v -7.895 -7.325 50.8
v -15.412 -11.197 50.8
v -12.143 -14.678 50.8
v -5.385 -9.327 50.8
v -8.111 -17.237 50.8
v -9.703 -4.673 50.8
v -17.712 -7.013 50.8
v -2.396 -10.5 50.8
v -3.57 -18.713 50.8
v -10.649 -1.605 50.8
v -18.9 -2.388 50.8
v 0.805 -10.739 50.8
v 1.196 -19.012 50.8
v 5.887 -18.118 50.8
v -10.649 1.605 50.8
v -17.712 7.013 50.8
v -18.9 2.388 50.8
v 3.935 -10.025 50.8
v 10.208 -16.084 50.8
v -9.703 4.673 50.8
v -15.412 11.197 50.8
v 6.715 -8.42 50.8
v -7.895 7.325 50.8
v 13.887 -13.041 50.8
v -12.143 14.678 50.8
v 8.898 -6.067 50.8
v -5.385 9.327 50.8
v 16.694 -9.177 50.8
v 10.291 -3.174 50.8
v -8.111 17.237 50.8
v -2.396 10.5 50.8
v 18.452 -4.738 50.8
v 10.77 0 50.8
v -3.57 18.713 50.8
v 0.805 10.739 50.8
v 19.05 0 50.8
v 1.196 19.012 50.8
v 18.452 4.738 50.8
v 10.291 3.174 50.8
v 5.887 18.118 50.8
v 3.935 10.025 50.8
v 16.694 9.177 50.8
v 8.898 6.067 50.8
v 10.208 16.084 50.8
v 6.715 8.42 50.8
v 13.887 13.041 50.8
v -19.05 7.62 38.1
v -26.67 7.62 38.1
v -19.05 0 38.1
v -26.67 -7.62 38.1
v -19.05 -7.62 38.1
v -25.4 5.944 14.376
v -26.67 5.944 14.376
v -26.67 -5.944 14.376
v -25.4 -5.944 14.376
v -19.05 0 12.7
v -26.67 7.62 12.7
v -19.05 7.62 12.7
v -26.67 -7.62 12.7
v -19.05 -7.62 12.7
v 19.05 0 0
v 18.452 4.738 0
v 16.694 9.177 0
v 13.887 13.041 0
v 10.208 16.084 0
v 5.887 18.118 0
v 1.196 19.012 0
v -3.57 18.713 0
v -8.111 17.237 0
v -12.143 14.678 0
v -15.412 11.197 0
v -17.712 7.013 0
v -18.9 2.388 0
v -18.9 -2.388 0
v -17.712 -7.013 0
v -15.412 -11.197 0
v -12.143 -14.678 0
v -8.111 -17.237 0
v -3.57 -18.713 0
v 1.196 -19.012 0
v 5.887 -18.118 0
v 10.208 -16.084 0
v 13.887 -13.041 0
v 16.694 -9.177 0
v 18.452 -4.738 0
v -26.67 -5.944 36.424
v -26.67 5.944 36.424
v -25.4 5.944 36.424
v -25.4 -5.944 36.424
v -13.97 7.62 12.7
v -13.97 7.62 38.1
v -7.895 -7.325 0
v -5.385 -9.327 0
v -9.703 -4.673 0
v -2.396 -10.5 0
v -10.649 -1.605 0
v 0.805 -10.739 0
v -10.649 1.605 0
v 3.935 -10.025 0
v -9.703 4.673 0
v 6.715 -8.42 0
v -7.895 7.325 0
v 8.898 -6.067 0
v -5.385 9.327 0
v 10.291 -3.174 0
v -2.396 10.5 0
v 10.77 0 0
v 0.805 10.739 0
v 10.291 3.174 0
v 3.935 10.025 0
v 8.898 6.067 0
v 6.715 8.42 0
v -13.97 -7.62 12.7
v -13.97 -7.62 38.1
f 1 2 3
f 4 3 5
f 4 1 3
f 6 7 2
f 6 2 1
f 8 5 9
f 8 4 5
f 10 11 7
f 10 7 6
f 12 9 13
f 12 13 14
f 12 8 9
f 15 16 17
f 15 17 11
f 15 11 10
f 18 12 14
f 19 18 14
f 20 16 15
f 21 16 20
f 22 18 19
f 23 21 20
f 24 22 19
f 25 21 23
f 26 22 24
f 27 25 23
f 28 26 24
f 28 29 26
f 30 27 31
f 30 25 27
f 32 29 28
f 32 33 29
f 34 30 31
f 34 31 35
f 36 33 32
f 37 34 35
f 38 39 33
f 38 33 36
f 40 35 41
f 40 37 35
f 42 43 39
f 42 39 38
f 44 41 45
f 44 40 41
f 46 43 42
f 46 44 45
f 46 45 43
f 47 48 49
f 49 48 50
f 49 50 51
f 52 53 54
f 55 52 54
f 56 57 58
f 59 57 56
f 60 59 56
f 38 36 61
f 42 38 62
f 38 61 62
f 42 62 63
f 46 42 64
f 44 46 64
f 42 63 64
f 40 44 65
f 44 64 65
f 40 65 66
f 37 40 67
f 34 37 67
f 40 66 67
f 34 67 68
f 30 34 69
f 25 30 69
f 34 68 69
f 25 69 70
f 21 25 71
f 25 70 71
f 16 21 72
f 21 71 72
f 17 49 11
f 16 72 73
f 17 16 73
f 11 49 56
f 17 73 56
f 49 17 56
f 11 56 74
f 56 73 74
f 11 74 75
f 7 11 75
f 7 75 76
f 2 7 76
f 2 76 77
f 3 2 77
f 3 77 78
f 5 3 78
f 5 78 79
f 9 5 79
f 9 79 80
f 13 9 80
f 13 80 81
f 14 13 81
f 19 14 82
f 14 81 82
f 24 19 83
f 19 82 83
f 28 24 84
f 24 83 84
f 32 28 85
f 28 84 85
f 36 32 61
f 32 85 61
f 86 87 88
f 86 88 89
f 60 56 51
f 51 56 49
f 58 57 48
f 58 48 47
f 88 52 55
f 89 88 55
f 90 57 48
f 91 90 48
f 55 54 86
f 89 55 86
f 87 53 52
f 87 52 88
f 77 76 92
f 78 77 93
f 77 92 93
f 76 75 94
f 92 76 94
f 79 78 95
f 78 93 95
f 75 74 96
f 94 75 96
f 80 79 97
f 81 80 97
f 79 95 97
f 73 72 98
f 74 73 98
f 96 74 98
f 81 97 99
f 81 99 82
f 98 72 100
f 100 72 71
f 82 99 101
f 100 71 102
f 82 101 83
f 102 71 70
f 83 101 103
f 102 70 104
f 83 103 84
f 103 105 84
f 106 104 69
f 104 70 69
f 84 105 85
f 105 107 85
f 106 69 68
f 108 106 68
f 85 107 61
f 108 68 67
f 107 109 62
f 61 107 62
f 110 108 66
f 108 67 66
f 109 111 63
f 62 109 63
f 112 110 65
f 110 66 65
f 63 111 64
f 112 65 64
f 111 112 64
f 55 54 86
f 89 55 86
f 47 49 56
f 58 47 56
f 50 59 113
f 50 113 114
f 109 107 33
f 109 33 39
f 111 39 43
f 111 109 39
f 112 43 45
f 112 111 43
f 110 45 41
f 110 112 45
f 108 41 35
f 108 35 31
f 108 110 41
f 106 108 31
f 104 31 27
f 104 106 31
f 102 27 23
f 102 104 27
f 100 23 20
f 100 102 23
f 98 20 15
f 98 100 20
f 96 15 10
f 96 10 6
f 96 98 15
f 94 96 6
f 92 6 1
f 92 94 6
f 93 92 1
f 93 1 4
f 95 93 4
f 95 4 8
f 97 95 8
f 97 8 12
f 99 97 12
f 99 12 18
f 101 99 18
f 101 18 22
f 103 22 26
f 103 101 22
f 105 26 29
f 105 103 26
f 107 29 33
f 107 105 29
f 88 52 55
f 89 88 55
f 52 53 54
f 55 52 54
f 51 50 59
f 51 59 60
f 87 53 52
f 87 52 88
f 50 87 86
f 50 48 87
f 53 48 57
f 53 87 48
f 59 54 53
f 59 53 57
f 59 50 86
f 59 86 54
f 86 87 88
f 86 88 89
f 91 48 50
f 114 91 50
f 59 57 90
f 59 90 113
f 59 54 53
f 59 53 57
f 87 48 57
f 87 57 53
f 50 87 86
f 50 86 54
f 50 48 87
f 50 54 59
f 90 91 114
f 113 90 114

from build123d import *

# Parameters (mm, degrees)
F0_R      = 19.05
F0_R_2    = 10.7696
F1_DEPTH  = 50.8
F2_W      = 7.62
F2_H      = 25.4
F3_DEPTH  = 7.62
F3_FACE_W = 7.62
F3_FACE_H = 25.4
F4_DEPTH  = 7.62
F5_W      = 15.24
F5_H      = 25.4
F6_DEPTH  = 12.7
F7_W      = 11.8872
F7_H      = 22.0472
F8_DEPTH  = 1.27


with BuildPart() as f1:
    # F0 (on Top) → F1 (new body)
    with BuildSketch(Plane.XY):
        Circle(F0_R)
        Circle(F0_R_2, mode=Mode.SUBTRACT)
    extrude(amount=F1_DEPTH)



with BuildPart() as f3:
    # F2 (on Front) → F3 (new body)
    with BuildSketch(Plane.XZ):
        with Locations((-22.86, 25.4)):
            Rectangle(F2_W, F2_H)
    extrude(amount=F3_DEPTH)


with BuildPart() as f1_1:
    add(f1.part)

    add(f3.part)  # F4 merges F3
    # F3_face (on face) → F4 (join)
    with BuildSketch(Plane(origin=(-22.86, 0, 25.4), x_dir=(1, 0, 0), z_dir=(0, 1, 0))):
        Rectangle(F3_FACE_W, F3_FACE_H)
    extrude(amount=F4_DEPTH)


with BuildPart() as f6:
    # F5 (on face) → F6 (new body)
    with BuildSketch(Plane(origin=(-26.67, 0, 0), x_dir=(0, -1, 0), z_dir=(-1, 0, 0))):
        with Locations((0, 25.4)):
            Rectangle(F5_W, F5_H)
    extrude(amount=-F6_DEPTH)


with BuildPart() as f8_tool:
    # F7 (on face) → F8 (new body)
    with BuildSketch(Plane(origin=(-26.67, 0, 0), x_dir=(0, -1, 0), z_dir=(-1, 0, 0))):
        with Locations((0, 25.4)):
            Rectangle(F7_W, F7_H)
    extrude(amount=-F8_DEPTH)


with BuildPart() as f1_2:
    add(f1_1.part)

    # F8: cut by f8_tool
    add(f8_tool.part, mode=Mode.SUBTRACT)


with BuildPart() as f6_1:
    add(f6.part)

    # F8: cut by f8_tool
    add(f8_tool.part, mode=Mode.SUBTRACT)


solid = Compound([f1_2.part, f6_1.part])
